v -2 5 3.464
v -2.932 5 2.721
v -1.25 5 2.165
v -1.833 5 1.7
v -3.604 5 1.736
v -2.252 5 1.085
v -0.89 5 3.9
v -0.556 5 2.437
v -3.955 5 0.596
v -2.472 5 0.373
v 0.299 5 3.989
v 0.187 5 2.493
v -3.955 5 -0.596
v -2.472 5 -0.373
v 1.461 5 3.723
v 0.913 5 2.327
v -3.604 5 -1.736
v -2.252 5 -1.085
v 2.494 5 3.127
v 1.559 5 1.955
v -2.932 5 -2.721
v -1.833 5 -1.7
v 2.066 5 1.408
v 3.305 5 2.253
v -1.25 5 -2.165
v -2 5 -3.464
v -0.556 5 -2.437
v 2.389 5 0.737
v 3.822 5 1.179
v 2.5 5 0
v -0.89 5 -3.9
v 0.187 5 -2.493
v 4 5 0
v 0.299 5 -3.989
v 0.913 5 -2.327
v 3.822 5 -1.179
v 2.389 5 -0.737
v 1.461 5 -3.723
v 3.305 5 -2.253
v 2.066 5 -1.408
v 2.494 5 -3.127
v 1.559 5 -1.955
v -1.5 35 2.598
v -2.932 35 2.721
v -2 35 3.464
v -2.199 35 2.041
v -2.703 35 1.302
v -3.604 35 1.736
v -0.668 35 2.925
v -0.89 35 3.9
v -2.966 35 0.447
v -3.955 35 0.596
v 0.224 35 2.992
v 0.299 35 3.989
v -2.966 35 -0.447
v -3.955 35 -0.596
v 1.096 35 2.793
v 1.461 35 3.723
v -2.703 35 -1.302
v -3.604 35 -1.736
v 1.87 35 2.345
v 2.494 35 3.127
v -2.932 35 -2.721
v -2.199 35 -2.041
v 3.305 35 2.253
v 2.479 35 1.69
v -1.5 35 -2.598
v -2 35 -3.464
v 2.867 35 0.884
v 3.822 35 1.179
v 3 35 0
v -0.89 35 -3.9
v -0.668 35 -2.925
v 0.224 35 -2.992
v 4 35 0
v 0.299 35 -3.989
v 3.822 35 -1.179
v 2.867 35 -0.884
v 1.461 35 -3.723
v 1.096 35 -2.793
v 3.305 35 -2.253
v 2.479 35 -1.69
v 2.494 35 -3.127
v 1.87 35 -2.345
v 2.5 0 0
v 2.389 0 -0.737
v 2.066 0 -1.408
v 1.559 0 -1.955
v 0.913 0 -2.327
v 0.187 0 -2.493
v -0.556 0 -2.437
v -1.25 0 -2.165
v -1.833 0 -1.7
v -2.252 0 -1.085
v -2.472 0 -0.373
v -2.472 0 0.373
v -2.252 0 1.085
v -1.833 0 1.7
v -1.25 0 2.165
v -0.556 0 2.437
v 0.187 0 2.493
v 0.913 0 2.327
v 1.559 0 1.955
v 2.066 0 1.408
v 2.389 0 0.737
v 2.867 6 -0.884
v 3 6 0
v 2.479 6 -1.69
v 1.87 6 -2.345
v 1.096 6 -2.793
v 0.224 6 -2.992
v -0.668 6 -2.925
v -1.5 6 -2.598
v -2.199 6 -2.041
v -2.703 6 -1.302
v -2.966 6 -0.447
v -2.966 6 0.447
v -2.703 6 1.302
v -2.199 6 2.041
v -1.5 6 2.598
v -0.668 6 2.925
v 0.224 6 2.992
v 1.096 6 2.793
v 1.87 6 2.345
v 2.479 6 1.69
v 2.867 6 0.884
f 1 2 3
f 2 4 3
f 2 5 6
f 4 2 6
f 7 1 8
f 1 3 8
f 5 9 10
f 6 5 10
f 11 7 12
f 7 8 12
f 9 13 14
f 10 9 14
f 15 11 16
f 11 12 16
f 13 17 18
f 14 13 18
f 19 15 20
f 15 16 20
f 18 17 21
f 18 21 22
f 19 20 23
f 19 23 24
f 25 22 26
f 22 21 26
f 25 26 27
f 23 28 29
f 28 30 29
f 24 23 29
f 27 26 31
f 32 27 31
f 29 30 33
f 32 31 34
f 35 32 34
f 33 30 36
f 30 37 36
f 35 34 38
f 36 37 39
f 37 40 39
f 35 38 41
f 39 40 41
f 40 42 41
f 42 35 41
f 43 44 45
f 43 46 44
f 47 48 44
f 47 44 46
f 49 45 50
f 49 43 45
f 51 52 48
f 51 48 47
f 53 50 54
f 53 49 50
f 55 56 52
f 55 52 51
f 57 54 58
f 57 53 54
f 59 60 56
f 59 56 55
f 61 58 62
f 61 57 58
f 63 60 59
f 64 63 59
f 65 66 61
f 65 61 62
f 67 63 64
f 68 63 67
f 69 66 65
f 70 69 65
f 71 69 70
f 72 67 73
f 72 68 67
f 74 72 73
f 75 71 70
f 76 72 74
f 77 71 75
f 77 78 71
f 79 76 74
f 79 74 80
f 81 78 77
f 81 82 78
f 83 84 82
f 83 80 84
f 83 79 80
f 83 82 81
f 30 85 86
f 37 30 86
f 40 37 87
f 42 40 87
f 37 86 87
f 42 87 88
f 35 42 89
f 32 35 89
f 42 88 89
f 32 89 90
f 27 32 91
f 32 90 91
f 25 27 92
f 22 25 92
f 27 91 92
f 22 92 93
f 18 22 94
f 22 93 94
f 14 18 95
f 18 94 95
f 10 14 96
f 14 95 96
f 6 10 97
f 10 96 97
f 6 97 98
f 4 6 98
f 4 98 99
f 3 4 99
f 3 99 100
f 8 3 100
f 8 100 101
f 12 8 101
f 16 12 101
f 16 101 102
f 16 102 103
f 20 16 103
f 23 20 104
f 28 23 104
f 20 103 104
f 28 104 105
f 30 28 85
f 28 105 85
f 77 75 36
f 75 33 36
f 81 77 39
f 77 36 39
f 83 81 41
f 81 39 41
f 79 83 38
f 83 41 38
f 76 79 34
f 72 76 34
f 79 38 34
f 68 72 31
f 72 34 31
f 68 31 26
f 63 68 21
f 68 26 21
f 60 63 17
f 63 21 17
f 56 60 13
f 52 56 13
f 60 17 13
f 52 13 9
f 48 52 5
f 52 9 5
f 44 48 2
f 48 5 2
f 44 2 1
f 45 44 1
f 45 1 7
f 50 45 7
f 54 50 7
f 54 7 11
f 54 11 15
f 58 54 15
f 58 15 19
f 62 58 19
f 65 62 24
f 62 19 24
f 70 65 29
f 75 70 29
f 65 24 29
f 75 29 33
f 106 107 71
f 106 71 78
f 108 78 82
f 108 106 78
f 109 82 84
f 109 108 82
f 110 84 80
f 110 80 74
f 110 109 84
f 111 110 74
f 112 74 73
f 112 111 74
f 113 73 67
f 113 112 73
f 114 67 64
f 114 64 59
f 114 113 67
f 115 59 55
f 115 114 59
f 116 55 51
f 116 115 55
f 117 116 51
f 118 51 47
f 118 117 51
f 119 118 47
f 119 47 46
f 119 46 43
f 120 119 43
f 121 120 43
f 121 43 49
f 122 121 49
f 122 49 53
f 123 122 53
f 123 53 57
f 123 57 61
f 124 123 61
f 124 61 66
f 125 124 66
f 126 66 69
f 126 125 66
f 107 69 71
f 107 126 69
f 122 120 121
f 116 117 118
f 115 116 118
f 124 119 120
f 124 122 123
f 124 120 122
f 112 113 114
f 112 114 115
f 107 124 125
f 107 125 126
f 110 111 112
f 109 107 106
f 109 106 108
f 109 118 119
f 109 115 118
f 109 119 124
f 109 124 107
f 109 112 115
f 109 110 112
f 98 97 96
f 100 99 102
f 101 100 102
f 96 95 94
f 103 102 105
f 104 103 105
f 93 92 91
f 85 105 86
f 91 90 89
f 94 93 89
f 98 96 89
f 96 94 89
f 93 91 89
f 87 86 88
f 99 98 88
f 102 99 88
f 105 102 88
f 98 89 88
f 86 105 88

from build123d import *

# Parameters (mm, degrees)
SKETCH1_R           = 2.5
BOSS_EXTRUDE1_DEPTH = 5
BOSS_EXTRUDE2_START = 5
SKETCH1_3_R         = 4
BOSS_EXTRUDE2_DEPTH = 1
BOSS_EXTRUDE3_START = 6
SKETCH1_4_R         = 4
SKETCH1_4_R_2       = 3
BOSS_EXTRUDE3_DEPTH = 29


with BuildPart() as part:
    # Sketch1 → Boss-Extrude1 (new body)
    with BuildSketch(Plane(origin=(0, 0, 0), x_dir=(1, 0, 0), z_dir=(0, 1, 0))):
        Circle(SKETCH1_R)
    extrude(amount=BOSS_EXTRUDE1_DEPTH)

    # Sketch1<3> → Boss-Extrude2 (add)
    with BuildSketch(Plane(origin=(0, 0, 0), x_dir=(1, 0, 0), z_dir=(0, 1, 0)).offset(BOSS_EXTRUDE2_START)):
        Circle(SKETCH1_3_R)
    extrude(amount=BOSS_EXTRUDE2_DEPTH)

    # Sketch1<4> → Boss-Extrude3 (add)
    with BuildSketch(Plane(origin=(0, 0, 0), x_dir=(1, 0, 0), z_dir=(0, 1, 0)).offset(BOSS_EXTRUDE3_START)):
        Circle(SKETCH1_4_R)
        Circle(SKETCH1_4_R_2, mode=Mode.SUBTRACT)
    extrude(amount=BOSS_EXTRUDE3_DEPTH)


solid = part.part
